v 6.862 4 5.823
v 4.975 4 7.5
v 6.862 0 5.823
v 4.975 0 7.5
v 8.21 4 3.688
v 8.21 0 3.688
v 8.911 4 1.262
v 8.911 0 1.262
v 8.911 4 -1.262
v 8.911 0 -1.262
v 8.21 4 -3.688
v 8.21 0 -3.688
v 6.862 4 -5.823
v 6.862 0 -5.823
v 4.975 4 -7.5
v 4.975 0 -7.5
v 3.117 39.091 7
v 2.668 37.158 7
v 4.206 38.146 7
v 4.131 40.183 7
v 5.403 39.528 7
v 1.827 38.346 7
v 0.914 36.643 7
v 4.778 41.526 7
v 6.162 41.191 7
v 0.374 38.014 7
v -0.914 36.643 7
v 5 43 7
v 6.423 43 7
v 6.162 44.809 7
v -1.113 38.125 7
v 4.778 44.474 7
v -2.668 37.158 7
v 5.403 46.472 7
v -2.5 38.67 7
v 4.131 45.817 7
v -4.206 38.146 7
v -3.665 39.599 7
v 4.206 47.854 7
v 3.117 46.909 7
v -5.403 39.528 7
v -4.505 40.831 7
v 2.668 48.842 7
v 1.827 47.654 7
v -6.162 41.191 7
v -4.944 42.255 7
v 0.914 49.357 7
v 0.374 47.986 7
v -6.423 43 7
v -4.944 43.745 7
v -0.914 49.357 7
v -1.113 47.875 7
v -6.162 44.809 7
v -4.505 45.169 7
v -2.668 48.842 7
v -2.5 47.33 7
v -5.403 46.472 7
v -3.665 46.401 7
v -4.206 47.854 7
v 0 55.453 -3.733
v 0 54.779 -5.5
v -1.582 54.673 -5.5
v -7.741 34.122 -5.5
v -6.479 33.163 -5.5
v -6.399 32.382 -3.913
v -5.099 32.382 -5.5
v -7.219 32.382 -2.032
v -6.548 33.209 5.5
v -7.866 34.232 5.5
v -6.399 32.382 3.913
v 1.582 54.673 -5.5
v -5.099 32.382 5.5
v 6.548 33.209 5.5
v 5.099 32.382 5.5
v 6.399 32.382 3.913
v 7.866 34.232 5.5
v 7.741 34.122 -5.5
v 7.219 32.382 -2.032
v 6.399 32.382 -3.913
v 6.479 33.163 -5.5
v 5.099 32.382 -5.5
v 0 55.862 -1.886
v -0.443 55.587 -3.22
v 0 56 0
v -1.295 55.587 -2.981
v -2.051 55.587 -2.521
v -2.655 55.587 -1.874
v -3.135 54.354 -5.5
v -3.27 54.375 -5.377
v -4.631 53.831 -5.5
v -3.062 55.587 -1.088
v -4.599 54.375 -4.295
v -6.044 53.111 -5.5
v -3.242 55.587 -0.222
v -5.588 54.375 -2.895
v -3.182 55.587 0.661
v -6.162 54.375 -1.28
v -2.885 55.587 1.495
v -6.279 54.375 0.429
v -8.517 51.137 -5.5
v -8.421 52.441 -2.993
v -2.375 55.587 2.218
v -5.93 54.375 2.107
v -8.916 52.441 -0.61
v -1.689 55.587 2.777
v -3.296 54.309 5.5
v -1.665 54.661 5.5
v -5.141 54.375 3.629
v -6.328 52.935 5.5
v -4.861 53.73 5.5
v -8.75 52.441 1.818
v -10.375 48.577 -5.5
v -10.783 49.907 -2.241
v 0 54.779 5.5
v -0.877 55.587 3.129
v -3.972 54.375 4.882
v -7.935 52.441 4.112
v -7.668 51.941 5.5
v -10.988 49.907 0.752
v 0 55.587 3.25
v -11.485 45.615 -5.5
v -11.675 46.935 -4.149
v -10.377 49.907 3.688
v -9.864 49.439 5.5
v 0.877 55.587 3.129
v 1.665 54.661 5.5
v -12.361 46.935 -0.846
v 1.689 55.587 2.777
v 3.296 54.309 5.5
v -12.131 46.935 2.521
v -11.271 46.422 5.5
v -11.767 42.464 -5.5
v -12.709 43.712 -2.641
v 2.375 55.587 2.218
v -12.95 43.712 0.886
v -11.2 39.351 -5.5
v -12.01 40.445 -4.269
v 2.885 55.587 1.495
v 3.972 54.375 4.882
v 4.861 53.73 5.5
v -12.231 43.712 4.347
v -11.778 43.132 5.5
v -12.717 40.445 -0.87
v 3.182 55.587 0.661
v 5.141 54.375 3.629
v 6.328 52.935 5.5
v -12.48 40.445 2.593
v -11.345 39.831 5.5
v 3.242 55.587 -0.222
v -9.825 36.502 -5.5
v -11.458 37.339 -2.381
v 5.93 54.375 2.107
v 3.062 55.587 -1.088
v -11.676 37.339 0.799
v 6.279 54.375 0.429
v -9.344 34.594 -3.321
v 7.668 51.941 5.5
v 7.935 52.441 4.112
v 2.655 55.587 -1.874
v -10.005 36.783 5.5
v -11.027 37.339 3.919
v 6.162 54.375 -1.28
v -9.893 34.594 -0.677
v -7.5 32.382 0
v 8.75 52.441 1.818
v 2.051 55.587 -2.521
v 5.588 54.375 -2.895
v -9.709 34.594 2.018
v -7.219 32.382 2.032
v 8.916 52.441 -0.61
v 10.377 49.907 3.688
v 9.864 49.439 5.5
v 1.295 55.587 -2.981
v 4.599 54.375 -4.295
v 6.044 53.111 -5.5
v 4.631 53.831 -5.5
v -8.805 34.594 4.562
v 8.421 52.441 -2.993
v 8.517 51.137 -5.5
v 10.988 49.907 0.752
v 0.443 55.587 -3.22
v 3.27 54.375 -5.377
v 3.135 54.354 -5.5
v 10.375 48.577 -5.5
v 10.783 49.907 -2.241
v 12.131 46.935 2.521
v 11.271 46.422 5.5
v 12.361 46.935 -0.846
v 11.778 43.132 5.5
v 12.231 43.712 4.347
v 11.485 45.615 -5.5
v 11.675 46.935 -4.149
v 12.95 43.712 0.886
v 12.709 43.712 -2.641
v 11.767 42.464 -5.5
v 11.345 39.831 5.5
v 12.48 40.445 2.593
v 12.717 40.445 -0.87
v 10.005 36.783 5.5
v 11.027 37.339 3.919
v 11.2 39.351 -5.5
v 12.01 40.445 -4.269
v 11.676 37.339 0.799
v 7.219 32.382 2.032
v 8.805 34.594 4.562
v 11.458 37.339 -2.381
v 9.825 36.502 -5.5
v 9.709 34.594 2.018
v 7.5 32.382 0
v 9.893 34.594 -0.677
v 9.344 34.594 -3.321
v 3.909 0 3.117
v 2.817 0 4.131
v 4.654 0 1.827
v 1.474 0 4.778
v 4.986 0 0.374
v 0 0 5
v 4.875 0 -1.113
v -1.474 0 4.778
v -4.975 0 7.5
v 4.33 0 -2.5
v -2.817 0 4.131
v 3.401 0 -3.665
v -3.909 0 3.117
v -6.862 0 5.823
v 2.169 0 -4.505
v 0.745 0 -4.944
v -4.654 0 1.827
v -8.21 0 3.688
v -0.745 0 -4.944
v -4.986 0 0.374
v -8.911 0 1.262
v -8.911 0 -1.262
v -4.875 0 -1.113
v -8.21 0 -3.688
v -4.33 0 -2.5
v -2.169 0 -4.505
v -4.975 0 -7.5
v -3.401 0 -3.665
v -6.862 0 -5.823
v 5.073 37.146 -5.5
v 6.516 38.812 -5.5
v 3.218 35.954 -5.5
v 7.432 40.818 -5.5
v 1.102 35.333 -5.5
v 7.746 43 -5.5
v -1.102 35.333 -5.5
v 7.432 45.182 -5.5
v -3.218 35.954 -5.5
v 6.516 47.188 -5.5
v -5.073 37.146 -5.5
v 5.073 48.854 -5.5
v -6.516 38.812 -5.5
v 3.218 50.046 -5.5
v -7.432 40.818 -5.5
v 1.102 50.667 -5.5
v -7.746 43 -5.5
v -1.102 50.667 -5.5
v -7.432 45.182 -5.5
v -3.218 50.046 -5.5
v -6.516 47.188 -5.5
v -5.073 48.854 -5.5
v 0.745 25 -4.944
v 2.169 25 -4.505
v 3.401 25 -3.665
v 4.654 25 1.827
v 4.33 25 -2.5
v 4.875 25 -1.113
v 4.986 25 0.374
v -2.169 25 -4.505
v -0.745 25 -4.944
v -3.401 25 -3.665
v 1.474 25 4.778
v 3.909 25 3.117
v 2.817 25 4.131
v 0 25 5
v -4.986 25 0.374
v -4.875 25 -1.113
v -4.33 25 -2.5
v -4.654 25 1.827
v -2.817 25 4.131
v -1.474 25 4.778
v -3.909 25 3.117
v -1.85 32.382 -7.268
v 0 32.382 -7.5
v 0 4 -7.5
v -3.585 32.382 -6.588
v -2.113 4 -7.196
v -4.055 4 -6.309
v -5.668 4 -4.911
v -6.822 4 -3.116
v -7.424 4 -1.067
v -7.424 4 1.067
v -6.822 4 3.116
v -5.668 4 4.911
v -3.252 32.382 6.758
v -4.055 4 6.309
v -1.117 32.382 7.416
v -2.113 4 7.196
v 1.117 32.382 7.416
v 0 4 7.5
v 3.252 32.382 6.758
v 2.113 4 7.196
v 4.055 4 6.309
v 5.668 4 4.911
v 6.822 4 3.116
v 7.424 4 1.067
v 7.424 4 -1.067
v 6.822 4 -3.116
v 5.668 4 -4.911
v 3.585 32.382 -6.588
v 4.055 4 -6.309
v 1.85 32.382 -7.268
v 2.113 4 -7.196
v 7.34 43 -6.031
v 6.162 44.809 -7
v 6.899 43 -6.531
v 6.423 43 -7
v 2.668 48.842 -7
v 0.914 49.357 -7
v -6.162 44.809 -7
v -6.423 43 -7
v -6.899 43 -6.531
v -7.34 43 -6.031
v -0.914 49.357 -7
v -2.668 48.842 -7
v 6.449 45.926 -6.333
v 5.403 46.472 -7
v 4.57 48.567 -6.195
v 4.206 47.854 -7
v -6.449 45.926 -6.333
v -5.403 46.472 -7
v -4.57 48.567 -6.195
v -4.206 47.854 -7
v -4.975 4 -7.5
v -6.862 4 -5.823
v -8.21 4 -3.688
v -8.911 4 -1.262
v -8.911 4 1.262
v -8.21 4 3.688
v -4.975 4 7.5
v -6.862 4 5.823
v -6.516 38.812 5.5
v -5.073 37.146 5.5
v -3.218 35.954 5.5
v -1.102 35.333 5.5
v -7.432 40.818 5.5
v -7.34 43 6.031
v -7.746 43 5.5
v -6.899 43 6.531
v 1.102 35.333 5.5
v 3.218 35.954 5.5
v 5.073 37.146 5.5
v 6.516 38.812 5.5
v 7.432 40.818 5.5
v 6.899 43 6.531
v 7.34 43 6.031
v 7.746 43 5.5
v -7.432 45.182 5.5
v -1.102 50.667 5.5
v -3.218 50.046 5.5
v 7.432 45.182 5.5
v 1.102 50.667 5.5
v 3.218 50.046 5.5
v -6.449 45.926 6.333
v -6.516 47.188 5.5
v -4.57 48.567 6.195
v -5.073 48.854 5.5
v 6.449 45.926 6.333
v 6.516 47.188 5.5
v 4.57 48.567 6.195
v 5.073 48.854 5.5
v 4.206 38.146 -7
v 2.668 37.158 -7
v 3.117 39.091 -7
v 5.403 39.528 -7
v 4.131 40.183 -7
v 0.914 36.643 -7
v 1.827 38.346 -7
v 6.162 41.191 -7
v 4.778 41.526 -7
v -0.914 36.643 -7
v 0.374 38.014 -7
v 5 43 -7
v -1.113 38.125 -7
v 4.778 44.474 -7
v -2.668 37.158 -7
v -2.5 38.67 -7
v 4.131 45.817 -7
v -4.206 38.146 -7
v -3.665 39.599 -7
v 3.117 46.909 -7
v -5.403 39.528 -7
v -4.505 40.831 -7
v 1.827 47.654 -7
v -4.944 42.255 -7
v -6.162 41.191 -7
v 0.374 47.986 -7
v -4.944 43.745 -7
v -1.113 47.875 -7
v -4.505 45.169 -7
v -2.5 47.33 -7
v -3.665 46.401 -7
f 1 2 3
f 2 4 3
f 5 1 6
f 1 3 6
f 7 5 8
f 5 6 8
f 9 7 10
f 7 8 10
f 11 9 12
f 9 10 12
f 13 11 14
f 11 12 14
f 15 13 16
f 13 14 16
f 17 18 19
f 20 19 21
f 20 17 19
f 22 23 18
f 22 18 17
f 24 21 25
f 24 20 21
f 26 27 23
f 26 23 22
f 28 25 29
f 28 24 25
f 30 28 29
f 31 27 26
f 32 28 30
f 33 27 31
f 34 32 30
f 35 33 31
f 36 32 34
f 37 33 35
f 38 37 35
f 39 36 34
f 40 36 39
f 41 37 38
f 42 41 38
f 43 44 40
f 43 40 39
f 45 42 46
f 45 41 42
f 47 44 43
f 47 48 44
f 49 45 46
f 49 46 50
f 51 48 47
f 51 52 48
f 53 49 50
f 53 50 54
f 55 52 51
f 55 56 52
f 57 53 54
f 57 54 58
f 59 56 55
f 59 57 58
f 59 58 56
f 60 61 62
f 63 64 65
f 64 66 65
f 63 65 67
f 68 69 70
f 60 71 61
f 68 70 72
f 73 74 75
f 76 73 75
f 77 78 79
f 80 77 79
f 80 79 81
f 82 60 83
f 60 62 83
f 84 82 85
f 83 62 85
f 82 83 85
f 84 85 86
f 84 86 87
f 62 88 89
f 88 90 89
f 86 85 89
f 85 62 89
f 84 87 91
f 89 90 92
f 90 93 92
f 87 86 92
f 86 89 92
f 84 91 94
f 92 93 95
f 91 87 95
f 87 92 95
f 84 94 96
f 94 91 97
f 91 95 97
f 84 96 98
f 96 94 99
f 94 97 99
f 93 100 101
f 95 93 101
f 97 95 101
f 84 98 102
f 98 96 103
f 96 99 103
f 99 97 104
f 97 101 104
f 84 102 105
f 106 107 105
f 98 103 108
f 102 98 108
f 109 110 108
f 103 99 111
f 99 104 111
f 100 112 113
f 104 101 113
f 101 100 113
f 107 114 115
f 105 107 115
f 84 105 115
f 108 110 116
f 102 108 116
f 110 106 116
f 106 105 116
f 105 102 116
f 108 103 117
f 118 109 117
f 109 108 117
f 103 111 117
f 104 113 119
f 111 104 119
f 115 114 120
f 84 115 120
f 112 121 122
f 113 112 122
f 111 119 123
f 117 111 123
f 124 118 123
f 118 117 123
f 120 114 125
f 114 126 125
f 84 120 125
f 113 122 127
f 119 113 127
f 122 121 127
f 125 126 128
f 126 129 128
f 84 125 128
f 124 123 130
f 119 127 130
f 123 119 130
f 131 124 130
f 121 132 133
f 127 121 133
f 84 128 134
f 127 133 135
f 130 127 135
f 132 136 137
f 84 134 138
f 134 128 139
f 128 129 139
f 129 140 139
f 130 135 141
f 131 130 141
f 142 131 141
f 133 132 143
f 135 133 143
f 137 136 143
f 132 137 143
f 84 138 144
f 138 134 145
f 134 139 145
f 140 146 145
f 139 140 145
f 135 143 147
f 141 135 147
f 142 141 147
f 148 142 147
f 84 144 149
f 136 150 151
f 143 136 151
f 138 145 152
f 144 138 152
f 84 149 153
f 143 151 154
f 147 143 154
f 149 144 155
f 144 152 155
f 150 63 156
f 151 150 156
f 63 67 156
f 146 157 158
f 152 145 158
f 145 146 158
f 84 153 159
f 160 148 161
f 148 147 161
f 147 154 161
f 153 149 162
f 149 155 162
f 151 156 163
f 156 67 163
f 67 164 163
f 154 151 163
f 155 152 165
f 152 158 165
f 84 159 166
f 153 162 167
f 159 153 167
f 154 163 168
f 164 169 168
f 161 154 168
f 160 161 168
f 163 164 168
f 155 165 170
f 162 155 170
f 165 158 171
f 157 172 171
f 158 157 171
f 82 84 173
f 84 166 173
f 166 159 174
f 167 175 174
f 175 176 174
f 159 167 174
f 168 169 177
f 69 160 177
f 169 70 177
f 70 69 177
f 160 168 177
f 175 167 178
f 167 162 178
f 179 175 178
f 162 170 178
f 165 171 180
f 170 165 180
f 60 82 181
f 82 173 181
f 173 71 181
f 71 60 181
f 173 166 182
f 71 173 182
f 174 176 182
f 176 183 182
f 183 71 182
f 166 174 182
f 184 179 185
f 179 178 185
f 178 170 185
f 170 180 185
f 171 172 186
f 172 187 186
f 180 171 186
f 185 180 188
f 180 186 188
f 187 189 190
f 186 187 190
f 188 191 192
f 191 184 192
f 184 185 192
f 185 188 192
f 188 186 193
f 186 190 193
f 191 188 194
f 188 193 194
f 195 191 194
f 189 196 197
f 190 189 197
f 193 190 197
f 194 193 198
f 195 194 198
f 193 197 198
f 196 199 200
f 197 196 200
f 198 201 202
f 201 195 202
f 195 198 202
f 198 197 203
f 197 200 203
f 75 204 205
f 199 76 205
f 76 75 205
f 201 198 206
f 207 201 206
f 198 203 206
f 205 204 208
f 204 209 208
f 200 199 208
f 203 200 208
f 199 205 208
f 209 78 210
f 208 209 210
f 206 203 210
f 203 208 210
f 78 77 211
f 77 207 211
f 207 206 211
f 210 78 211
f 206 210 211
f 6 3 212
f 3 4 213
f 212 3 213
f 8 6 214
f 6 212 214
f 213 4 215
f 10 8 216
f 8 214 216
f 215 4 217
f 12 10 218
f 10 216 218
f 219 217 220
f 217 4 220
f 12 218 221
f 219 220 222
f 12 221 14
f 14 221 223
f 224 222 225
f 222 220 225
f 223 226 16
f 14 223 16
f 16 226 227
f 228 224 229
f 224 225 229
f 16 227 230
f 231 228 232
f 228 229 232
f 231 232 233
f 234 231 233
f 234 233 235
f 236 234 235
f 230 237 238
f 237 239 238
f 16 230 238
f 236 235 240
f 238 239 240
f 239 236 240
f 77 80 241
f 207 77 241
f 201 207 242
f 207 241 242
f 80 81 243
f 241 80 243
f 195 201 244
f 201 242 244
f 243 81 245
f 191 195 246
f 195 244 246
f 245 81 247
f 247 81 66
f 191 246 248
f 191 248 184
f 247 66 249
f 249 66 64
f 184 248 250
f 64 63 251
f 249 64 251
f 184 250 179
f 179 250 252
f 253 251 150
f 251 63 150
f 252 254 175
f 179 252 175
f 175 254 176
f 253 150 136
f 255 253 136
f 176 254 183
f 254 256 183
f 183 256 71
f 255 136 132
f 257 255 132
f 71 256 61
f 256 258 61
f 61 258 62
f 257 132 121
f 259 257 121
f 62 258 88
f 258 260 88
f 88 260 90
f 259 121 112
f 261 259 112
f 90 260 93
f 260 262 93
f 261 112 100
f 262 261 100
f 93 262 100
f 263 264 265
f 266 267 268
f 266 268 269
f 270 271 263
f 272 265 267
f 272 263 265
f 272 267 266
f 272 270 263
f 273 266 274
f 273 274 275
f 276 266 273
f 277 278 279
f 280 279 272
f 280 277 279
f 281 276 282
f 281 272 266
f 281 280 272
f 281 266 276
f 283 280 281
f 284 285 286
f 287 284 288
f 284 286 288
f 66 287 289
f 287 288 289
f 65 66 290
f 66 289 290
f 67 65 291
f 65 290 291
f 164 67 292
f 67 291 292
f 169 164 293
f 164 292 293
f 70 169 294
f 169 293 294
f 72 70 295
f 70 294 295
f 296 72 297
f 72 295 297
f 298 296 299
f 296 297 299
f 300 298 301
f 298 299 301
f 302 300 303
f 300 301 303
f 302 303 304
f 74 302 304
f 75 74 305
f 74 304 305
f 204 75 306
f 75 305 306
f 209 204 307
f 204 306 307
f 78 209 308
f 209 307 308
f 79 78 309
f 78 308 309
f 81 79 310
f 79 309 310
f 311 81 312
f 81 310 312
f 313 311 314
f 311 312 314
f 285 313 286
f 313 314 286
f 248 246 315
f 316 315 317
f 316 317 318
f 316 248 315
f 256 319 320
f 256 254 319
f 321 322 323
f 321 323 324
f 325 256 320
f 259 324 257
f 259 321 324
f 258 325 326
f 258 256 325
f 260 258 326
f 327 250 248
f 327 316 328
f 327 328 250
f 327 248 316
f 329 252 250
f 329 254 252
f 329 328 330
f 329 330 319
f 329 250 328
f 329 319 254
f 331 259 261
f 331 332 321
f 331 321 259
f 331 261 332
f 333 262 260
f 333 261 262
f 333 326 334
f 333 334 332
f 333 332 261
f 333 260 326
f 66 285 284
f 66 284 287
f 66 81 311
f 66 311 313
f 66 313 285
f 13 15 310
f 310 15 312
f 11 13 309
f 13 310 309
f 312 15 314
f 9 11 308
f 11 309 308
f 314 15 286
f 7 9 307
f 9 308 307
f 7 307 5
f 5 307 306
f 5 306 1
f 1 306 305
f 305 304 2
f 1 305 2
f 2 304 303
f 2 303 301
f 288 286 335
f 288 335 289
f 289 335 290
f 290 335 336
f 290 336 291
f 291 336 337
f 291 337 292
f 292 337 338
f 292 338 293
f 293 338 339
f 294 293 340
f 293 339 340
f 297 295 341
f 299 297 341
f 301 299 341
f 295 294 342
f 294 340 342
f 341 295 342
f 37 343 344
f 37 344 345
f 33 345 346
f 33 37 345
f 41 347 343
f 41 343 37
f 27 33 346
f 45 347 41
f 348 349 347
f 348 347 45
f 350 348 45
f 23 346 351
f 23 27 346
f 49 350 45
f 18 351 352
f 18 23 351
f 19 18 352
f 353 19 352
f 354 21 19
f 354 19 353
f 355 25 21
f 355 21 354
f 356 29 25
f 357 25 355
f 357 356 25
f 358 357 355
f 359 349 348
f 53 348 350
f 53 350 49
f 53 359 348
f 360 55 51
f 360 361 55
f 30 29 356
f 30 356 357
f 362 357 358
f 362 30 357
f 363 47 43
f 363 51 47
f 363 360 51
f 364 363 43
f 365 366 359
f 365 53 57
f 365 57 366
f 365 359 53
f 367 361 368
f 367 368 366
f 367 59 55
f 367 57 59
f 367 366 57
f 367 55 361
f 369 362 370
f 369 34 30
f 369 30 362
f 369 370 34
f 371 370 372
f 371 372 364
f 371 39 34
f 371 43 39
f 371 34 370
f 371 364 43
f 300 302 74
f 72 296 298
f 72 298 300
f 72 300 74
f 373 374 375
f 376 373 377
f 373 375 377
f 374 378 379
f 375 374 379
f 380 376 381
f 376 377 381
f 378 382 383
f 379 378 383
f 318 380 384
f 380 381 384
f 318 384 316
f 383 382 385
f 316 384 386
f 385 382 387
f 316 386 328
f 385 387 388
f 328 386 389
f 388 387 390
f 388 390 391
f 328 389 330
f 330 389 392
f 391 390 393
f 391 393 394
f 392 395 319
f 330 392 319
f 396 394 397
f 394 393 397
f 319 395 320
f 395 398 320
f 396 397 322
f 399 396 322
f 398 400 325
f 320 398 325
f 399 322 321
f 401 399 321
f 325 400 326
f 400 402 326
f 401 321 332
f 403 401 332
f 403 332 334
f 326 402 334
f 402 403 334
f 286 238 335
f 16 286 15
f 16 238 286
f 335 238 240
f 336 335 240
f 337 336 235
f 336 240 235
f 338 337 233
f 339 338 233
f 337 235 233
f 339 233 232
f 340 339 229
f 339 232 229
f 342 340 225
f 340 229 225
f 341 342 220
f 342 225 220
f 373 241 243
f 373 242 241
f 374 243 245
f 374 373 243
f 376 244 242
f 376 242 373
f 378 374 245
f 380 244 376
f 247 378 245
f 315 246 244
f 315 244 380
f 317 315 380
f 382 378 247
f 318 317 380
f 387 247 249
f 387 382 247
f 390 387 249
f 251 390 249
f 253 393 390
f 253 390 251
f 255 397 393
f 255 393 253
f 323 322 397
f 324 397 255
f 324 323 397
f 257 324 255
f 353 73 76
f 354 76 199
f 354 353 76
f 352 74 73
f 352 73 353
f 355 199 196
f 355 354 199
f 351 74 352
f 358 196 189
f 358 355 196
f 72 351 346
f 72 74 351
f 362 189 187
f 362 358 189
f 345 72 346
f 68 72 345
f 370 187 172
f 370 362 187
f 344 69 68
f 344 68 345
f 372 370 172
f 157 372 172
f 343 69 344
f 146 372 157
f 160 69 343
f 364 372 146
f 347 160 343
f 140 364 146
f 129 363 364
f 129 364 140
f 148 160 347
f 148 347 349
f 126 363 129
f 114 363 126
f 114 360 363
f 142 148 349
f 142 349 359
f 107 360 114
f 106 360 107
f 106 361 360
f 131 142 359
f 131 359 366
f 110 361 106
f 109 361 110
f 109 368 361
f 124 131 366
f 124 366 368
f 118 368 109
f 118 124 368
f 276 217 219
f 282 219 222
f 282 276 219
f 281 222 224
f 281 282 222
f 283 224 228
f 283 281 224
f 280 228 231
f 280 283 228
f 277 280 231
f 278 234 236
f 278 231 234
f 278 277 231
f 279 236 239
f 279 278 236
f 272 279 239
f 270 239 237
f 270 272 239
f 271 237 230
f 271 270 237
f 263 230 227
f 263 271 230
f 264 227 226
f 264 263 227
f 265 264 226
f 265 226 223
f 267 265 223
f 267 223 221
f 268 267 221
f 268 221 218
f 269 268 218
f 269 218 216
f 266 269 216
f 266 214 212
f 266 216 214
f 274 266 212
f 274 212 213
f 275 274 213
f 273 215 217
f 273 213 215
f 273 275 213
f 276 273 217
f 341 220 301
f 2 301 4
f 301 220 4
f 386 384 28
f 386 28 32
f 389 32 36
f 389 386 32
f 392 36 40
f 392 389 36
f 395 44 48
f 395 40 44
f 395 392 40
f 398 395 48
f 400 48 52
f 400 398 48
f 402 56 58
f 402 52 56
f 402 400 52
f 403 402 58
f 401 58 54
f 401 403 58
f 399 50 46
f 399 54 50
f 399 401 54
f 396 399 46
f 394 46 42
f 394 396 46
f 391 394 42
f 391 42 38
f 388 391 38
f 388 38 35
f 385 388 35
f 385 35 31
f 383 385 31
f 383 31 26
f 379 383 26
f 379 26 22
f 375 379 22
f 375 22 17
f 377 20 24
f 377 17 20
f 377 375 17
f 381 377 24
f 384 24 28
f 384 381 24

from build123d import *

# Parameters (mm, degrees)
CUT_EXTRUDE3_DEPTH      = 59.940648113
CUT_EXTRUDE3_DEPTH_BACK = 59.940648113
SKETCH3_W               = 17.579289035
SKETCH3_H               = 30.509322749
CUT_EXTRUDE4_DEPTH      = 59.268773799
CUT_EXTRUDE4_DEPTH_BACK = 59.268773799
SKETCH4_W               = 14.932737824
SKETCH4_H               = 19.875765969
CUT_EXTRUDE5_DEPTH      = 60.674114991
CUT_EXTRUDE5_DEPTH_BACK = 60.674114991
SKETCH5_R               = 5
CUT_EXTRUDE6_DEPTH      = 59.189346104
CUT_EXTRUDE6_DEPTH_BACK = 59.189346104
SKETCH6_W               = 15.994671042
SKETCH6_H               = 5.292782054
CUT_EXTRUDE7_DEPTH      = 58.976288256
CUT_EXTRUDE7_DEPTH_BACK = 25
SKETCH7_R               = 5


with BuildPart() as part:
    # Sketch1 → Revolve5 (revolve)
    with BuildSketch(Plane.XY):
        with BuildLine():
            Line((0, 52.5), (0, 53.5))
            ThreePointArc((0, 53.5), (-10.5, 43), (0, 32.5))
            Line((0, 32.5), (0, 33.5))
            ThreePointArc((0, 33.5), (-9.5, 43), (0, 52.5))
        make_face()
    revolve(axis=Axis((0, 0, 0), (0, 1, 0)))

    # Sketch1<7> → Revolve6 (revolve)
    with BuildSketch(Plane.XY):
        with BuildLine():
            Line((-7.5, 32.381619709), (-7.5, 4))
            Line((-7.5, 4), (-9, 4))
            Line((-9, 4), (-9, 0))
            Line((-9, 0), (0, 0))
            Line((0, 0), (0, 32.5))
            ThreePointArc((0, 32.5), (-10.5, 43), (0, 53.5))
            Line((0, 53.5), (0, 56))
            ThreePointArc((0, 56), (-12.39029749, 46.934530227), (-7.5, 32.381619709))
        make_face()
    revolve(axis=Axis((0, 0, 0), (0, 1, 0)))

    # Sketch3 → Cut-Extrude3 (cut, two sides: drawn at the far end of the back side and taken through both)
    with BuildSketch(Plane(origin=(0, 0, 0), x_dir=(0, 0, -1), z_dir=(1, 0, 0)).offset(-CUT_EXTRUDE3_DEPTH_BACK)):
        with Locations((-14.289644518, 47.636281084)):
            Rectangle(SKETCH3_W, SKETCH3_H)
        with Locations((14.289644518, 47.636281084)):
            Rectangle(SKETCH3_W, SKETCH3_H)
    extrude(amount=CUT_EXTRUDE3_DEPTH + CUT_EXTRUDE3_DEPTH_BACK, mode=Mode.SUBTRACT)

    # Sketch1<8> → Revolve7 (revolve)
    with BuildSketch(Plane.XY):
        with BuildLine():
            Line((0, 33.5), (0, 52.5))
            ThreePointArc((0, 52.5), (-9.5, 43), (0, 33.5))
        make_face()
    revolve(axis=Axis((0, 0, 0), (0, 1, 0)))

    # Sketch4 → Cut-Extrude4 (cut, two sides: drawn at the far end of the back side and taken through both)
    with BuildSketch(Plane(origin=(0, 0, 0), x_dir=(0, 0, -1), z_dir=(1, 0, 0)).offset(-CUT_EXTRUDE4_DEPTH_BACK)):
        with Locations((-14.466368912, 45.402031304)):
            Rectangle(SKETCH4_W, SKETCH4_H)
        with Locations((14.466368912, 45.402031304)):
            Rectangle(SKETCH4_W, SKETCH4_H)
    extrude(amount=CUT_EXTRUDE4_DEPTH + CUT_EXTRUDE4_DEPTH_BACK, mode=Mode.SUBTRACT)

    # Sketch5 → Cut-Extrude5 (cut, two sides: drawn at the far end of the back side and taken through both)
    with BuildSketch(Plane.XY.offset(7).offset(-CUT_EXTRUDE5_DEPTH_BACK)):
        with Locations((0, 43)):
            Circle(SKETCH5_R)
    extrude(amount=CUT_EXTRUDE5_DEPTH + CUT_EXTRUDE5_DEPTH_BACK, mode=Mode.SUBTRACT)

    # Sketch6 → Cut-Extrude6 (cut, two sides: drawn at the far end of the back side and taken through both)
    with BuildSketch(Plane(origin=(0, 0, 0), x_dir=(1, 0, 0), z_dir=(0, 1, 0)).offset(-CUT_EXTRUDE6_DEPTH_BACK)):
        with Locations((0.436218301, 10.146391027)):
            Rectangle(SKETCH6_W, SKETCH6_H)
        with Locations((0.436218301, -10.146391027)):
            Rectangle(SKETCH6_W, SKETCH6_H)
    extrude(amount=CUT_EXTRUDE6_DEPTH + CUT_EXTRUDE6_DEPTH_BACK, mode=Mode.SUBTRACT)

    # Sketch7 → Cut-Extrude7 (cut, two sides: drawn at the far end of the back side and taken through both)
    with BuildSketch(Plane.XZ.offset(-CUT_EXTRUDE7_DEPTH_BACK)):
        Circle(SKETCH7_R)
    extrude(amount=CUT_EXTRUDE7_DEPTH + CUT_EXTRUDE7_DEPTH_BACK, mode=Mode.SUBTRACT)


solid = part.part
